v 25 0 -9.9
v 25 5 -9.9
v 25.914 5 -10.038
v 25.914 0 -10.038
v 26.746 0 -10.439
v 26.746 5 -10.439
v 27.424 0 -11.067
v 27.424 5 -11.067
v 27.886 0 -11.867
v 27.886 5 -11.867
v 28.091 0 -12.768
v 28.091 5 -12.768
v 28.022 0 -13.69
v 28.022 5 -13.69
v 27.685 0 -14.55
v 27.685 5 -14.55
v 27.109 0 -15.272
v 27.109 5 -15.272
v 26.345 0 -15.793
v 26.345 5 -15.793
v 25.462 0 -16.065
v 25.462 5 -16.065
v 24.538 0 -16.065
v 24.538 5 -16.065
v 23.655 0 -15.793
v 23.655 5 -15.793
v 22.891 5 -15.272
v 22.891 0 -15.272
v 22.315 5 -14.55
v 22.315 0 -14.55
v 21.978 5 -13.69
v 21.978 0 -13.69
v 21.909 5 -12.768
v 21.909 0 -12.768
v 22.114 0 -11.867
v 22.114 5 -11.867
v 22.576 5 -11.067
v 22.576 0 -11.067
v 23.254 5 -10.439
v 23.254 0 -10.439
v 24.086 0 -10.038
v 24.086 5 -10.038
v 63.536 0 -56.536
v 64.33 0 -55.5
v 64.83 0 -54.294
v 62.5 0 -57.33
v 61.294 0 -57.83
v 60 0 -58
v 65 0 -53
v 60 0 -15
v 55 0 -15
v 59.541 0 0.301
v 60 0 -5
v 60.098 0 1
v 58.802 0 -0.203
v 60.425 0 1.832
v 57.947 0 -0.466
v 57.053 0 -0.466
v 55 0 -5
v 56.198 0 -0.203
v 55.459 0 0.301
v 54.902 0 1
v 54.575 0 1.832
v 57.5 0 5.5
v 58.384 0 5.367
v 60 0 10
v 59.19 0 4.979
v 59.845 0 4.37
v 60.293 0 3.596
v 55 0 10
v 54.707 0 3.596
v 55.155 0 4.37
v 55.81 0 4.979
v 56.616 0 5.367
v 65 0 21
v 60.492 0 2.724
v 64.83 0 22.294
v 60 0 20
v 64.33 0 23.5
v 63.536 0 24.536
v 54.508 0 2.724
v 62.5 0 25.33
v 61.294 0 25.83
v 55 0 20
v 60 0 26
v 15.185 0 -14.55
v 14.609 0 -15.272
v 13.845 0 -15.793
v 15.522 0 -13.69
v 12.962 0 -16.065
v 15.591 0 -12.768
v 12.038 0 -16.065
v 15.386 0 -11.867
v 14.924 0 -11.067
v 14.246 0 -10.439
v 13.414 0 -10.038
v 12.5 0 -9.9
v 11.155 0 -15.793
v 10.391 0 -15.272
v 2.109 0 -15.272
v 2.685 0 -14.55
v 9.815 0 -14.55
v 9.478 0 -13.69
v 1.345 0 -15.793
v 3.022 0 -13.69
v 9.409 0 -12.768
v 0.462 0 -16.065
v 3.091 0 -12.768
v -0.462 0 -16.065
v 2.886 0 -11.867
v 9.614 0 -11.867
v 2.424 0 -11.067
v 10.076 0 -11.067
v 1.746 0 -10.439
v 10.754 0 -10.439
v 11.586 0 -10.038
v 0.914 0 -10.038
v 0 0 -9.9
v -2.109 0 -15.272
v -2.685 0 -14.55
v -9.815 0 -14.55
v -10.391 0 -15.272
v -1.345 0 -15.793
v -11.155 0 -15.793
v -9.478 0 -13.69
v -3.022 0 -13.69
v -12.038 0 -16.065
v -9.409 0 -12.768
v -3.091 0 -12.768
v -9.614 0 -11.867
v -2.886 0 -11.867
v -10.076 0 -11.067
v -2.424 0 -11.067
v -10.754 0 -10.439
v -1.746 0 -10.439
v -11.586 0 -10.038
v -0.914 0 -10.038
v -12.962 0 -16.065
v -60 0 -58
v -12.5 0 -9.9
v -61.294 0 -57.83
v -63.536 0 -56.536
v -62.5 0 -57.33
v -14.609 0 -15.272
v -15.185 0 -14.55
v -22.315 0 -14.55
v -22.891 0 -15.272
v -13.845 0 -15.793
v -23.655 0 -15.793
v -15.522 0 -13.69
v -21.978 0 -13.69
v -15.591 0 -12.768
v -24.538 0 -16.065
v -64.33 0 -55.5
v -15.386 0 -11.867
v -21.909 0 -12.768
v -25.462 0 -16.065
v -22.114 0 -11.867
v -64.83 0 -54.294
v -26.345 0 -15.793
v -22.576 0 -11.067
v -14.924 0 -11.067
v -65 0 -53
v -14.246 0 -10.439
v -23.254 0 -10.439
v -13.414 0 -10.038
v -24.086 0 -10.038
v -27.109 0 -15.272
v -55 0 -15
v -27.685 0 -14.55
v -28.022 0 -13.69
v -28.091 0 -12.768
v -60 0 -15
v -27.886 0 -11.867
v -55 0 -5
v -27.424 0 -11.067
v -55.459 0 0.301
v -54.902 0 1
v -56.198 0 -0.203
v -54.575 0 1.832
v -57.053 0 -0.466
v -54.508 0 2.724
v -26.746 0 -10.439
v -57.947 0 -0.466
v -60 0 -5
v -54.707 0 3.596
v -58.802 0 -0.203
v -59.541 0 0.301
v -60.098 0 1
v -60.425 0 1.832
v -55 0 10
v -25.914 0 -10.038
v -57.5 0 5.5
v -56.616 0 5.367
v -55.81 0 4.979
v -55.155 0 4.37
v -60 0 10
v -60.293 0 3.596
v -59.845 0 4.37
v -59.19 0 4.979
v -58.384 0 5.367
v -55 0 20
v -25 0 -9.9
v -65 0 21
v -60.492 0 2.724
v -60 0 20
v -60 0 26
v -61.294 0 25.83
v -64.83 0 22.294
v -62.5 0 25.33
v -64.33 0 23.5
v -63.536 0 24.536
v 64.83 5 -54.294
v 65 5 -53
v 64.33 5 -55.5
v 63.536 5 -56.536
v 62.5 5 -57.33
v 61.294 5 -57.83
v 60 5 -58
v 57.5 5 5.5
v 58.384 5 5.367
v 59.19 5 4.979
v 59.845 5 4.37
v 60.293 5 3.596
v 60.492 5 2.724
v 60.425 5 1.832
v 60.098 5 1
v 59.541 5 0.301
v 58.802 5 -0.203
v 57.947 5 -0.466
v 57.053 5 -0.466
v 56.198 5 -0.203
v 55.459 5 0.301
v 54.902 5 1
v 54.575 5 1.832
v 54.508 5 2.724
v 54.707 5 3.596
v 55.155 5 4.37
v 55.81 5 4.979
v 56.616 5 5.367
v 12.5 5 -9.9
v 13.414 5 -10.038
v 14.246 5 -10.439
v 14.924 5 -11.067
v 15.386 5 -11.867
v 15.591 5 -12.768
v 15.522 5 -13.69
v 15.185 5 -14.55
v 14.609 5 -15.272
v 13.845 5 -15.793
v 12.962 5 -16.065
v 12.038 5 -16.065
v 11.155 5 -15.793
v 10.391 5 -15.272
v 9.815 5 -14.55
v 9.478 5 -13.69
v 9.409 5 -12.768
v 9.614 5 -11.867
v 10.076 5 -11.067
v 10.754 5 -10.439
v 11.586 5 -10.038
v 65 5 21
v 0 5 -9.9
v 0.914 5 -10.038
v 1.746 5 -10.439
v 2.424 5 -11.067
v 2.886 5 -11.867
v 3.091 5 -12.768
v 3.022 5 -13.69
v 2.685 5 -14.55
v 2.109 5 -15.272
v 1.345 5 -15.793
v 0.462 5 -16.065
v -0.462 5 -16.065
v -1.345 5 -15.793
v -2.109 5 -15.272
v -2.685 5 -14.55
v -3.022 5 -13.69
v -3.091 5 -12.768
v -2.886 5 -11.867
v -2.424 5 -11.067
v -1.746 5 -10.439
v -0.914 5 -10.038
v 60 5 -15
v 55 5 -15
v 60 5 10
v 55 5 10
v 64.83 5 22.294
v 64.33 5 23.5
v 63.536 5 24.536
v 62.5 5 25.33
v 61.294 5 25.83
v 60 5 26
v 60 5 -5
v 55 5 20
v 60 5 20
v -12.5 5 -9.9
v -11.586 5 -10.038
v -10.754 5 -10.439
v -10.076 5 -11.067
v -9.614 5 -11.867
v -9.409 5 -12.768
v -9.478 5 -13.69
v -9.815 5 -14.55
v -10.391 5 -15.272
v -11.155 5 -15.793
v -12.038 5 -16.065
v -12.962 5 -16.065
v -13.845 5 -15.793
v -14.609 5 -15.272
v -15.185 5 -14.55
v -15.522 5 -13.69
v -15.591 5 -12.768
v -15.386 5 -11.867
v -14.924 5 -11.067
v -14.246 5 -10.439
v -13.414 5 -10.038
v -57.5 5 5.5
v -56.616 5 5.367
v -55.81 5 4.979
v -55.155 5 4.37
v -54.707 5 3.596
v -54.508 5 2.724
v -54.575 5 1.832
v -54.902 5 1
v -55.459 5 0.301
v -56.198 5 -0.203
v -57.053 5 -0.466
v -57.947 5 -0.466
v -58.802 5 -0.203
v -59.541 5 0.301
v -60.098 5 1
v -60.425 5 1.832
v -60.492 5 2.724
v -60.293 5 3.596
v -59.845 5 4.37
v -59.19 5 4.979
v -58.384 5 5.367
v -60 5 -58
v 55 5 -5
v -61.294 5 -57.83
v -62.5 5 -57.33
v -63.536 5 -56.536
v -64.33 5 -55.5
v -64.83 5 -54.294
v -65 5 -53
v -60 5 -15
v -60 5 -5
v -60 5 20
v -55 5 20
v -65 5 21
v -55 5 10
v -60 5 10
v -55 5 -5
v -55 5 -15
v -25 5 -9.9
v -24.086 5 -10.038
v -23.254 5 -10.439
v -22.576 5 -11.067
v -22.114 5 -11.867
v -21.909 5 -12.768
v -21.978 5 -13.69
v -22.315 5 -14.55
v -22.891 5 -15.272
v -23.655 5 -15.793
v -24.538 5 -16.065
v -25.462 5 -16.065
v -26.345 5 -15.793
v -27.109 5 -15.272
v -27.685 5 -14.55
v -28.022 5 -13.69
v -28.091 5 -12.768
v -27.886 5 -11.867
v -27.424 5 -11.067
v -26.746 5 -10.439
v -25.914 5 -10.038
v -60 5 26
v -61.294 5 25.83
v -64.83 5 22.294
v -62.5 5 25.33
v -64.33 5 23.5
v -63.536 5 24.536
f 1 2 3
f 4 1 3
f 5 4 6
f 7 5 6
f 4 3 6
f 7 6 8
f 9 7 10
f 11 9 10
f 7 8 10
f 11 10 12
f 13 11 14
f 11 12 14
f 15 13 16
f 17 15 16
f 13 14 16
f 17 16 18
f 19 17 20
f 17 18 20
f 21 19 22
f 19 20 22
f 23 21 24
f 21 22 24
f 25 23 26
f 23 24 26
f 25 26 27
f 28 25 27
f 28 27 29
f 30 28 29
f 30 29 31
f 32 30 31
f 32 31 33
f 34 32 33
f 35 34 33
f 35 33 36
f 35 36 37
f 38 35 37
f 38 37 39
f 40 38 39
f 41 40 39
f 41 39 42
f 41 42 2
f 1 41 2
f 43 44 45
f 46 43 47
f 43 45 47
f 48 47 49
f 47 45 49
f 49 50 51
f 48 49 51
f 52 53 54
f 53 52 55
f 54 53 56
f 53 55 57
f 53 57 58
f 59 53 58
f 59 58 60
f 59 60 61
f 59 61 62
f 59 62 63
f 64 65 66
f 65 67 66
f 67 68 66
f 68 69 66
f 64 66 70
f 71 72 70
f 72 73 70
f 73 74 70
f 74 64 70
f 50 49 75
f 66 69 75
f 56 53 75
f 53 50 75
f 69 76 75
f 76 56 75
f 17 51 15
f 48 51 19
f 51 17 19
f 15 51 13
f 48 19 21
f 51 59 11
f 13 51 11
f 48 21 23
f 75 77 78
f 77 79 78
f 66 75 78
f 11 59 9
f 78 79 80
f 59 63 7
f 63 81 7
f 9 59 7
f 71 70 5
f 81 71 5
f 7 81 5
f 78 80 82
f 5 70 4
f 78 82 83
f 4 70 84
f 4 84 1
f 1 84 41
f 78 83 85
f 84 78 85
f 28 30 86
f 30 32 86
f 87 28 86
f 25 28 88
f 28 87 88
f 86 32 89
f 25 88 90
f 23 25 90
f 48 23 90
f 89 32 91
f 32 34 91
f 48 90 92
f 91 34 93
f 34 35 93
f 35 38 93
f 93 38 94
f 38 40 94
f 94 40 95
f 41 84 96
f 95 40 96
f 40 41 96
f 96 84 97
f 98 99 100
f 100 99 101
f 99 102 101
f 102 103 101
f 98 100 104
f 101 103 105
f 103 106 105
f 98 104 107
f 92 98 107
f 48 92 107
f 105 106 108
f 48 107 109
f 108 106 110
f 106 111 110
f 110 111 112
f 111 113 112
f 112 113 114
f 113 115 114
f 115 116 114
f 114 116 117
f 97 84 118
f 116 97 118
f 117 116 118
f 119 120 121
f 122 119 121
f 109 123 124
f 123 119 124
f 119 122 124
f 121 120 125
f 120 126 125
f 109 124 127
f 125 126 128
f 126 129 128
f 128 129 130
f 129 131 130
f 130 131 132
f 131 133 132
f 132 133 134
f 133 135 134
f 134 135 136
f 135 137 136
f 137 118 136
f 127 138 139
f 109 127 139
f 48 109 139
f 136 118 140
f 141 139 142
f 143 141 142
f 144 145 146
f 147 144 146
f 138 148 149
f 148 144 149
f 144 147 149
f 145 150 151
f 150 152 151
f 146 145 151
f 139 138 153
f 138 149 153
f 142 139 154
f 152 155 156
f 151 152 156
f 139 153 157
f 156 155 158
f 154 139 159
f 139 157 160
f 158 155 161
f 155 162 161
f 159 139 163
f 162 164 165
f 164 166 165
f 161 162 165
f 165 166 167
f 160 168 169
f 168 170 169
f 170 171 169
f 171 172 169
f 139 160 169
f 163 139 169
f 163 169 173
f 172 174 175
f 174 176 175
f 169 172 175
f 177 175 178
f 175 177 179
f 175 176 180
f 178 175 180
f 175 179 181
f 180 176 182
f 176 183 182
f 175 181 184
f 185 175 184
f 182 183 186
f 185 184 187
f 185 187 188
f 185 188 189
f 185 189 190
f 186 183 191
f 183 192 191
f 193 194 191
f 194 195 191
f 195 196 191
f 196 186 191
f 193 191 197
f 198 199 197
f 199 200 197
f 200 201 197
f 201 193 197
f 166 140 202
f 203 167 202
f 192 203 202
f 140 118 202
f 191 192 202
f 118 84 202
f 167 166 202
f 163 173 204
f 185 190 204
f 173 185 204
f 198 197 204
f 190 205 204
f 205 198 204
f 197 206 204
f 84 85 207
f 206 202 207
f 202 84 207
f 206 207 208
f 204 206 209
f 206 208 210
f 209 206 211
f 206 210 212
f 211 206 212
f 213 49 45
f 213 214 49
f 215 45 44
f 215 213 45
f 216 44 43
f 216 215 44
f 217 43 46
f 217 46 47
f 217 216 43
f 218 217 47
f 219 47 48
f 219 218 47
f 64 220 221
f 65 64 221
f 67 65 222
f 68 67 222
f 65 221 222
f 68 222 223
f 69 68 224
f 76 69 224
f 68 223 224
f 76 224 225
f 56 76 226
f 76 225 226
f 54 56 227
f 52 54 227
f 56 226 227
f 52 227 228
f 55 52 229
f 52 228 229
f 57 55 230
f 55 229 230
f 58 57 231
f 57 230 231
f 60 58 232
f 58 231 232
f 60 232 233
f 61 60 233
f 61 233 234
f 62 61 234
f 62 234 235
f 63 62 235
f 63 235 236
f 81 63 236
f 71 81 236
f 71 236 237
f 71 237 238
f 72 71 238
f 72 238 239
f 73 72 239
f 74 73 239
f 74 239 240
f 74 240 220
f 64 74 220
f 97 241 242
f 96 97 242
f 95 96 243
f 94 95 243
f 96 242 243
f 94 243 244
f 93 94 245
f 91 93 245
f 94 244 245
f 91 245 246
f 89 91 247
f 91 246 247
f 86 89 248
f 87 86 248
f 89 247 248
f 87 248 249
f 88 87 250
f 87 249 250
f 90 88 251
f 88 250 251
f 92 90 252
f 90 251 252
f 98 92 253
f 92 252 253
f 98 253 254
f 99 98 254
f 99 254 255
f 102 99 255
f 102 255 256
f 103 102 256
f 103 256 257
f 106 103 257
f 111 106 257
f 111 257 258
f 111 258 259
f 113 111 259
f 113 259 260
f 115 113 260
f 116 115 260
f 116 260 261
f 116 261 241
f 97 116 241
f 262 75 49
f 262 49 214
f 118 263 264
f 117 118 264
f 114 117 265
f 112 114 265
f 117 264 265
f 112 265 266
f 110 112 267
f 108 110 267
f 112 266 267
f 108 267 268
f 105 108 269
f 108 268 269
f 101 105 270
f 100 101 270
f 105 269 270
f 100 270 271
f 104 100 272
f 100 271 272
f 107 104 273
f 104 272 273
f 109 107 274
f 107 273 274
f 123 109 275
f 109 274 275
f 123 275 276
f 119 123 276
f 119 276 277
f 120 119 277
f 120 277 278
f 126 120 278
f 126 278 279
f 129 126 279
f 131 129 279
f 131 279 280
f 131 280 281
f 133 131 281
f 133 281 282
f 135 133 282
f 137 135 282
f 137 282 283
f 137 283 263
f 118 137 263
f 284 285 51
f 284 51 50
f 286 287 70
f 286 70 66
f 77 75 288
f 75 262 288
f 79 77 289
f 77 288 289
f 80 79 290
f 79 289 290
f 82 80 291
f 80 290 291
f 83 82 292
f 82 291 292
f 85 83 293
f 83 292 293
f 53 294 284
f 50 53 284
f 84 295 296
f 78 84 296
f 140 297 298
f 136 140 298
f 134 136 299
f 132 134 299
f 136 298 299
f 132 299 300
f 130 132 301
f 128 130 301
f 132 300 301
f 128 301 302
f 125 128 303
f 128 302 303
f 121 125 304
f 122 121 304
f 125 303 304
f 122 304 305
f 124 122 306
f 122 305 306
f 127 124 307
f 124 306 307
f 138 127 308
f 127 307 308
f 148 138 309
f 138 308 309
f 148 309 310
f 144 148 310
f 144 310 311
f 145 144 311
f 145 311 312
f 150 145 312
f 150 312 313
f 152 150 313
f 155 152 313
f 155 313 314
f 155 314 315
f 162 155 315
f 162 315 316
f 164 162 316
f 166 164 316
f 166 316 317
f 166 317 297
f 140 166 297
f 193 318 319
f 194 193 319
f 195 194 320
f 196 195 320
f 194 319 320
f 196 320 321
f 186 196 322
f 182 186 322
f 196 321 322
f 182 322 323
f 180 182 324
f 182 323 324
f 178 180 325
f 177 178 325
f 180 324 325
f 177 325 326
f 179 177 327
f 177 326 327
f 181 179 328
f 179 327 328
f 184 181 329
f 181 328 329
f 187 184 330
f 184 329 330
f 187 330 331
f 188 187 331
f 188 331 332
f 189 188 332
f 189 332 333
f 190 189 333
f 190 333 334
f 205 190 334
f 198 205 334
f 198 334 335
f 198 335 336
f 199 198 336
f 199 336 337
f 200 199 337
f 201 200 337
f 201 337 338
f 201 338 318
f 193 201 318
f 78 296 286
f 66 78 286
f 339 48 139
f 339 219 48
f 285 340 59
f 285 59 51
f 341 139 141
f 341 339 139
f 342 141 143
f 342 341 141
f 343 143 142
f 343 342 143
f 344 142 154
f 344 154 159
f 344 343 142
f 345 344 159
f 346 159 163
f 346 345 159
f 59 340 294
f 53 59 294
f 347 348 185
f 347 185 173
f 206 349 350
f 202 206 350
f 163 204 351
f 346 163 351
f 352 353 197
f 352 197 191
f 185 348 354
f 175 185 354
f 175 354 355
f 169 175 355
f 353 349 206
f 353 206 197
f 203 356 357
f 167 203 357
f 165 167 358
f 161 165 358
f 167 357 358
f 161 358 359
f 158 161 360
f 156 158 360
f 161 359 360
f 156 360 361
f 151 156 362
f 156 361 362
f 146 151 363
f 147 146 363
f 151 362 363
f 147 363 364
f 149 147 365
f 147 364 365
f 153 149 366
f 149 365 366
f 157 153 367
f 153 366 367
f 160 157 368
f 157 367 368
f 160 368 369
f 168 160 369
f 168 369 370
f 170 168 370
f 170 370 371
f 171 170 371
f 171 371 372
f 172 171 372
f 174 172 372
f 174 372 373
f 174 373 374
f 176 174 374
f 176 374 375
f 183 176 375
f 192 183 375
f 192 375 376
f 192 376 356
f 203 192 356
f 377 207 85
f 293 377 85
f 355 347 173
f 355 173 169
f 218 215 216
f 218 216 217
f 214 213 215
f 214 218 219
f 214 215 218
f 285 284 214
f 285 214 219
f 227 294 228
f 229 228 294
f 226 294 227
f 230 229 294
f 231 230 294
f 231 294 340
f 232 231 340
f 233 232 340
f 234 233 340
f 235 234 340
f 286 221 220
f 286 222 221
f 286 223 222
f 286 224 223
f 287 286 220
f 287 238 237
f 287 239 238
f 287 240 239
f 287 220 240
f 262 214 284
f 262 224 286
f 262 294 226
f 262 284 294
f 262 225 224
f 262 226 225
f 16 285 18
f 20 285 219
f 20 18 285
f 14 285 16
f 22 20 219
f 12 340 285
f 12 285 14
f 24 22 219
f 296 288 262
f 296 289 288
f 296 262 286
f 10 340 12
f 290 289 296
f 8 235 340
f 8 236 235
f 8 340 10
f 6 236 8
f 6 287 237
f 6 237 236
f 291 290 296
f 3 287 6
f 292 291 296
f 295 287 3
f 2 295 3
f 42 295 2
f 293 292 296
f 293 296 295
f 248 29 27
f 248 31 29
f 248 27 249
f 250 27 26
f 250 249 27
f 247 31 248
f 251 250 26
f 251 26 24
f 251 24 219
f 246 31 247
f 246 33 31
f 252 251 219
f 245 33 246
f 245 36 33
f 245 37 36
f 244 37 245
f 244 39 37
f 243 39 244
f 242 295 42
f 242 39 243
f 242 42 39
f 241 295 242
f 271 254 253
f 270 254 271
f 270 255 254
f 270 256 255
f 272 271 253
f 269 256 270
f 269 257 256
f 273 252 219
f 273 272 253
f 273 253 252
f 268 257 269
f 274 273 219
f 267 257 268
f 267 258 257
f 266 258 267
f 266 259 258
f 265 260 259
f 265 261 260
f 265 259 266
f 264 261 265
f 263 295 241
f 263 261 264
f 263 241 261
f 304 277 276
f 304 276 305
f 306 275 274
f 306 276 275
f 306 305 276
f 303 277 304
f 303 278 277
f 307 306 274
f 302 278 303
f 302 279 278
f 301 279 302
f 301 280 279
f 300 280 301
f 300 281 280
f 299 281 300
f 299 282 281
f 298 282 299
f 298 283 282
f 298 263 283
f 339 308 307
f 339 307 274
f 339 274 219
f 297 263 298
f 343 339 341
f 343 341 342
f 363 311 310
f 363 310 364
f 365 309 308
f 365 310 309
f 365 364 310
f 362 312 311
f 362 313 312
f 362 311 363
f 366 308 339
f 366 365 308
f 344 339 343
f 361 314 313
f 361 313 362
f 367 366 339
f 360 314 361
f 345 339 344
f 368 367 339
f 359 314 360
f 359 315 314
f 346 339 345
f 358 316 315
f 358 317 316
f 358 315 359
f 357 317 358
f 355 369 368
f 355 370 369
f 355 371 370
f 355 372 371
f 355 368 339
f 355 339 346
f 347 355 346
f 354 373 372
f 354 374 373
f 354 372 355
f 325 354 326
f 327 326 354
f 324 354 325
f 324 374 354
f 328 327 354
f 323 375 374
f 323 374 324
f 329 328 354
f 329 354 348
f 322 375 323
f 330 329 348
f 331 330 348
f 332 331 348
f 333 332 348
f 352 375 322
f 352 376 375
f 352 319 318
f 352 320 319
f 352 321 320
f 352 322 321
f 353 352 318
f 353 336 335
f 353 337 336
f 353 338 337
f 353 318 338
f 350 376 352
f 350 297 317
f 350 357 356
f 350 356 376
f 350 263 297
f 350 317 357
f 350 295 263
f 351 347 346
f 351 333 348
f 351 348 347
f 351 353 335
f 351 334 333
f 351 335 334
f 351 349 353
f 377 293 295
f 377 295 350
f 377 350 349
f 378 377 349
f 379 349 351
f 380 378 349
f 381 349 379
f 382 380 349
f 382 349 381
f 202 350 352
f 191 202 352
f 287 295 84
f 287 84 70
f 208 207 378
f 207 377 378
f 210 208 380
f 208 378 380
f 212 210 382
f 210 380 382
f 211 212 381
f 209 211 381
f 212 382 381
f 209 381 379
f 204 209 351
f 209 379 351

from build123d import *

# Parameters (mm, degrees)
SKETCH1_W           = 130
SKETCH1_H           = 52
BOSS_EXTRUDE1_DEPTH = 5
SKETCH2_W           = 130
SKETCH2_H           = 5
BOSS_EXTRUDE2_DEPTH = 32
SKETCH3_R           = 3
SKETCH3_W           = 5
SKETCH3_H           = 10
CUT_EXTRUDE1_DEPTH  = 10
FILLET1_R           = 5
CUT_EXTRUDE2_REACH  = 89.258
SKETCH4_R           = 3.1


with BuildPart() as part:
    # Sketch1 → Boss-Extrude1 (new body)
    with BuildSketch(Plane(origin=(0, 0, 0), x_dir=(1, 0, 0), z_dir=(0, 1, 0))):
        Rectangle(SKETCH1_W, SKETCH1_H)
    extrude(amount=BOSS_EXTRUDE1_DEPTH)

    # Sketch2 → Boss-Extrude2 (add)
    with BuildSketch(Plane(origin=(0, 0, -26), x_dir=(-1, 0, 0), z_dir=(0, 0, -1))):
        with Locations((0, 2.5)):
            Rectangle(SKETCH2_W, SKETCH2_H)
    extrude(amount=BOSS_EXTRUDE2_DEPTH)

    # Sketch3 → Cut-Extrude1 (cut)
    with BuildSketch(Plane(origin=(0, 5, 0), x_dir=(1, 0, 0), z_dir=(0, 1, 0))):
        with Locations(Location((-57.5, -2.5, 0), (0, 0, 270))):
            Circle(SKETCH3_R)
        with Locations(Location((57.5, -2.5, 0), (0, 0, 270))):
            Circle(SKETCH3_R)
        with Locations((57.5, 10)):
            Rectangle(SKETCH3_W, SKETCH3_H)
        with Locations((-57.5, -15)):
            Rectangle(SKETCH3_W, SKETCH3_H)
        with Locations((-57.5, 10)):
            Rectangle(SKETCH3_W, SKETCH3_H)
        with Locations((57.5, -15)):
            Rectangle(SKETCH3_W, SKETCH3_H)
    extrude(amount=-CUT_EXTRUDE1_DEPTH, mode=Mode.SUBTRACT)

    # Fillet1
    fillet1_edges = [part.edges().sort_by_distance(p)[0] for p in [
        (65, 2.5, -58),
        (-65, 2.5, -58),
        (65, 2.5, 26),
        (-65, 2.5, 26),
    ]]
    fillet(fillet1_edges, radius=FILLET1_R)

    # Sketch4 → Cut-Extrude2 (cut, up to next)
    with BuildSketch(Plane(origin=(0, 5, 0), x_dir=(1, 0, 0), z_dir=(0, 1, 0)), mode=Mode.PRIVATE) as cut_extrude2_sk1:
        with Locations(Location((-12.5, 13, 0), (0, 0, 270))):
            Circle(SKETCH4_R)
    cut_extrude2_tool1 = extrude(cut_extrude2_sk1.sketch, amount=-CUT_EXTRUDE2_REACH, mode=Mode.PRIVATE) & part.part
    # Sketch4 → Cut-Extrude2 (cut, up to next)
    with BuildSketch(Plane(origin=(0, 5, 0), x_dir=(1, 0, 0), z_dir=(0, 1, 0)), mode=Mode.PRIVATE) as cut_extrude2_sk2:
        with Locations(Location((-25, 13, 0), (0, 0, 270))):
            Circle(SKETCH4_R)
    cut_extrude2_tool2 = extrude(cut_extrude2_sk2.sketch, amount=-CUT_EXTRUDE2_REACH, mode=Mode.PRIVATE) & part.part
    # Sketch4 → Cut-Extrude2 (cut, up to next)
    with BuildSketch(Plane(origin=(0, 5, 0), x_dir=(1, 0, 0), z_dir=(0, 1, 0)), mode=Mode.PRIVATE) as cut_extrude2_sk3:
        with Locations(Location((0, 13, 0), (0, 0, 270))):
            Circle(SKETCH4_R)
    cut_extrude2_tool3 = extrude(cut_extrude2_sk3.sketch, amount=-CUT_EXTRUDE2_REACH, mode=Mode.PRIVATE) & part.part
    # Sketch4 → Cut-Extrude2 (cut, up to next)
    with BuildSketch(Plane(origin=(0, 5, 0), x_dir=(1, 0, 0), z_dir=(0, 1, 0)), mode=Mode.PRIVATE) as cut_extrude2_sk4:
        with Locations(Location((12.5, 13, 0), (0, 0, 270))):
            Circle(SKETCH4_R)
    cut_extrude2_tool4 = extrude(cut_extrude2_sk4.sketch, amount=-CUT_EXTRUDE2_REACH, mode=Mode.PRIVATE) & part.part
    # Sketch4 → Cut-Extrude2 (cut, up to next)
    with BuildSketch(Plane(origin=(0, 5, 0), x_dir=(1, 0, 0), z_dir=(0, 1, 0)), mode=Mode.PRIVATE) as cut_extrude2_sk5:
        with Locations(Location((25, 13, 0), (0, 0, 270))):
            Circle(SKETCH4_R)
    cut_extrude2_tool5 = extrude(cut_extrude2_sk5.sketch, amount=-CUT_EXTRUDE2_REACH, mode=Mode.PRIVATE) & part.part
    add(cut_extrude2_tool1.solids().sort_by_distance((-12.5, 5, -13))[0], mode=Mode.SUBTRACT)
    add(cut_extrude2_tool2.solids().sort_by_distance((-25, 5, -13))[0], mode=Mode.SUBTRACT)
    add(cut_extrude2_tool3.solids().sort_by_distance((0, 5, -13))[0], mode=Mode.SUBTRACT)
    add(cut_extrude2_tool4.solids().sort_by_distance((12.5, 5, -13))[0], mode=Mode.SUBTRACT)
    add(cut_extrude2_tool5.solids().sort_by_distance((25, 5, -13))[0], mode=Mode.SUBTRACT)


solid = part.part
